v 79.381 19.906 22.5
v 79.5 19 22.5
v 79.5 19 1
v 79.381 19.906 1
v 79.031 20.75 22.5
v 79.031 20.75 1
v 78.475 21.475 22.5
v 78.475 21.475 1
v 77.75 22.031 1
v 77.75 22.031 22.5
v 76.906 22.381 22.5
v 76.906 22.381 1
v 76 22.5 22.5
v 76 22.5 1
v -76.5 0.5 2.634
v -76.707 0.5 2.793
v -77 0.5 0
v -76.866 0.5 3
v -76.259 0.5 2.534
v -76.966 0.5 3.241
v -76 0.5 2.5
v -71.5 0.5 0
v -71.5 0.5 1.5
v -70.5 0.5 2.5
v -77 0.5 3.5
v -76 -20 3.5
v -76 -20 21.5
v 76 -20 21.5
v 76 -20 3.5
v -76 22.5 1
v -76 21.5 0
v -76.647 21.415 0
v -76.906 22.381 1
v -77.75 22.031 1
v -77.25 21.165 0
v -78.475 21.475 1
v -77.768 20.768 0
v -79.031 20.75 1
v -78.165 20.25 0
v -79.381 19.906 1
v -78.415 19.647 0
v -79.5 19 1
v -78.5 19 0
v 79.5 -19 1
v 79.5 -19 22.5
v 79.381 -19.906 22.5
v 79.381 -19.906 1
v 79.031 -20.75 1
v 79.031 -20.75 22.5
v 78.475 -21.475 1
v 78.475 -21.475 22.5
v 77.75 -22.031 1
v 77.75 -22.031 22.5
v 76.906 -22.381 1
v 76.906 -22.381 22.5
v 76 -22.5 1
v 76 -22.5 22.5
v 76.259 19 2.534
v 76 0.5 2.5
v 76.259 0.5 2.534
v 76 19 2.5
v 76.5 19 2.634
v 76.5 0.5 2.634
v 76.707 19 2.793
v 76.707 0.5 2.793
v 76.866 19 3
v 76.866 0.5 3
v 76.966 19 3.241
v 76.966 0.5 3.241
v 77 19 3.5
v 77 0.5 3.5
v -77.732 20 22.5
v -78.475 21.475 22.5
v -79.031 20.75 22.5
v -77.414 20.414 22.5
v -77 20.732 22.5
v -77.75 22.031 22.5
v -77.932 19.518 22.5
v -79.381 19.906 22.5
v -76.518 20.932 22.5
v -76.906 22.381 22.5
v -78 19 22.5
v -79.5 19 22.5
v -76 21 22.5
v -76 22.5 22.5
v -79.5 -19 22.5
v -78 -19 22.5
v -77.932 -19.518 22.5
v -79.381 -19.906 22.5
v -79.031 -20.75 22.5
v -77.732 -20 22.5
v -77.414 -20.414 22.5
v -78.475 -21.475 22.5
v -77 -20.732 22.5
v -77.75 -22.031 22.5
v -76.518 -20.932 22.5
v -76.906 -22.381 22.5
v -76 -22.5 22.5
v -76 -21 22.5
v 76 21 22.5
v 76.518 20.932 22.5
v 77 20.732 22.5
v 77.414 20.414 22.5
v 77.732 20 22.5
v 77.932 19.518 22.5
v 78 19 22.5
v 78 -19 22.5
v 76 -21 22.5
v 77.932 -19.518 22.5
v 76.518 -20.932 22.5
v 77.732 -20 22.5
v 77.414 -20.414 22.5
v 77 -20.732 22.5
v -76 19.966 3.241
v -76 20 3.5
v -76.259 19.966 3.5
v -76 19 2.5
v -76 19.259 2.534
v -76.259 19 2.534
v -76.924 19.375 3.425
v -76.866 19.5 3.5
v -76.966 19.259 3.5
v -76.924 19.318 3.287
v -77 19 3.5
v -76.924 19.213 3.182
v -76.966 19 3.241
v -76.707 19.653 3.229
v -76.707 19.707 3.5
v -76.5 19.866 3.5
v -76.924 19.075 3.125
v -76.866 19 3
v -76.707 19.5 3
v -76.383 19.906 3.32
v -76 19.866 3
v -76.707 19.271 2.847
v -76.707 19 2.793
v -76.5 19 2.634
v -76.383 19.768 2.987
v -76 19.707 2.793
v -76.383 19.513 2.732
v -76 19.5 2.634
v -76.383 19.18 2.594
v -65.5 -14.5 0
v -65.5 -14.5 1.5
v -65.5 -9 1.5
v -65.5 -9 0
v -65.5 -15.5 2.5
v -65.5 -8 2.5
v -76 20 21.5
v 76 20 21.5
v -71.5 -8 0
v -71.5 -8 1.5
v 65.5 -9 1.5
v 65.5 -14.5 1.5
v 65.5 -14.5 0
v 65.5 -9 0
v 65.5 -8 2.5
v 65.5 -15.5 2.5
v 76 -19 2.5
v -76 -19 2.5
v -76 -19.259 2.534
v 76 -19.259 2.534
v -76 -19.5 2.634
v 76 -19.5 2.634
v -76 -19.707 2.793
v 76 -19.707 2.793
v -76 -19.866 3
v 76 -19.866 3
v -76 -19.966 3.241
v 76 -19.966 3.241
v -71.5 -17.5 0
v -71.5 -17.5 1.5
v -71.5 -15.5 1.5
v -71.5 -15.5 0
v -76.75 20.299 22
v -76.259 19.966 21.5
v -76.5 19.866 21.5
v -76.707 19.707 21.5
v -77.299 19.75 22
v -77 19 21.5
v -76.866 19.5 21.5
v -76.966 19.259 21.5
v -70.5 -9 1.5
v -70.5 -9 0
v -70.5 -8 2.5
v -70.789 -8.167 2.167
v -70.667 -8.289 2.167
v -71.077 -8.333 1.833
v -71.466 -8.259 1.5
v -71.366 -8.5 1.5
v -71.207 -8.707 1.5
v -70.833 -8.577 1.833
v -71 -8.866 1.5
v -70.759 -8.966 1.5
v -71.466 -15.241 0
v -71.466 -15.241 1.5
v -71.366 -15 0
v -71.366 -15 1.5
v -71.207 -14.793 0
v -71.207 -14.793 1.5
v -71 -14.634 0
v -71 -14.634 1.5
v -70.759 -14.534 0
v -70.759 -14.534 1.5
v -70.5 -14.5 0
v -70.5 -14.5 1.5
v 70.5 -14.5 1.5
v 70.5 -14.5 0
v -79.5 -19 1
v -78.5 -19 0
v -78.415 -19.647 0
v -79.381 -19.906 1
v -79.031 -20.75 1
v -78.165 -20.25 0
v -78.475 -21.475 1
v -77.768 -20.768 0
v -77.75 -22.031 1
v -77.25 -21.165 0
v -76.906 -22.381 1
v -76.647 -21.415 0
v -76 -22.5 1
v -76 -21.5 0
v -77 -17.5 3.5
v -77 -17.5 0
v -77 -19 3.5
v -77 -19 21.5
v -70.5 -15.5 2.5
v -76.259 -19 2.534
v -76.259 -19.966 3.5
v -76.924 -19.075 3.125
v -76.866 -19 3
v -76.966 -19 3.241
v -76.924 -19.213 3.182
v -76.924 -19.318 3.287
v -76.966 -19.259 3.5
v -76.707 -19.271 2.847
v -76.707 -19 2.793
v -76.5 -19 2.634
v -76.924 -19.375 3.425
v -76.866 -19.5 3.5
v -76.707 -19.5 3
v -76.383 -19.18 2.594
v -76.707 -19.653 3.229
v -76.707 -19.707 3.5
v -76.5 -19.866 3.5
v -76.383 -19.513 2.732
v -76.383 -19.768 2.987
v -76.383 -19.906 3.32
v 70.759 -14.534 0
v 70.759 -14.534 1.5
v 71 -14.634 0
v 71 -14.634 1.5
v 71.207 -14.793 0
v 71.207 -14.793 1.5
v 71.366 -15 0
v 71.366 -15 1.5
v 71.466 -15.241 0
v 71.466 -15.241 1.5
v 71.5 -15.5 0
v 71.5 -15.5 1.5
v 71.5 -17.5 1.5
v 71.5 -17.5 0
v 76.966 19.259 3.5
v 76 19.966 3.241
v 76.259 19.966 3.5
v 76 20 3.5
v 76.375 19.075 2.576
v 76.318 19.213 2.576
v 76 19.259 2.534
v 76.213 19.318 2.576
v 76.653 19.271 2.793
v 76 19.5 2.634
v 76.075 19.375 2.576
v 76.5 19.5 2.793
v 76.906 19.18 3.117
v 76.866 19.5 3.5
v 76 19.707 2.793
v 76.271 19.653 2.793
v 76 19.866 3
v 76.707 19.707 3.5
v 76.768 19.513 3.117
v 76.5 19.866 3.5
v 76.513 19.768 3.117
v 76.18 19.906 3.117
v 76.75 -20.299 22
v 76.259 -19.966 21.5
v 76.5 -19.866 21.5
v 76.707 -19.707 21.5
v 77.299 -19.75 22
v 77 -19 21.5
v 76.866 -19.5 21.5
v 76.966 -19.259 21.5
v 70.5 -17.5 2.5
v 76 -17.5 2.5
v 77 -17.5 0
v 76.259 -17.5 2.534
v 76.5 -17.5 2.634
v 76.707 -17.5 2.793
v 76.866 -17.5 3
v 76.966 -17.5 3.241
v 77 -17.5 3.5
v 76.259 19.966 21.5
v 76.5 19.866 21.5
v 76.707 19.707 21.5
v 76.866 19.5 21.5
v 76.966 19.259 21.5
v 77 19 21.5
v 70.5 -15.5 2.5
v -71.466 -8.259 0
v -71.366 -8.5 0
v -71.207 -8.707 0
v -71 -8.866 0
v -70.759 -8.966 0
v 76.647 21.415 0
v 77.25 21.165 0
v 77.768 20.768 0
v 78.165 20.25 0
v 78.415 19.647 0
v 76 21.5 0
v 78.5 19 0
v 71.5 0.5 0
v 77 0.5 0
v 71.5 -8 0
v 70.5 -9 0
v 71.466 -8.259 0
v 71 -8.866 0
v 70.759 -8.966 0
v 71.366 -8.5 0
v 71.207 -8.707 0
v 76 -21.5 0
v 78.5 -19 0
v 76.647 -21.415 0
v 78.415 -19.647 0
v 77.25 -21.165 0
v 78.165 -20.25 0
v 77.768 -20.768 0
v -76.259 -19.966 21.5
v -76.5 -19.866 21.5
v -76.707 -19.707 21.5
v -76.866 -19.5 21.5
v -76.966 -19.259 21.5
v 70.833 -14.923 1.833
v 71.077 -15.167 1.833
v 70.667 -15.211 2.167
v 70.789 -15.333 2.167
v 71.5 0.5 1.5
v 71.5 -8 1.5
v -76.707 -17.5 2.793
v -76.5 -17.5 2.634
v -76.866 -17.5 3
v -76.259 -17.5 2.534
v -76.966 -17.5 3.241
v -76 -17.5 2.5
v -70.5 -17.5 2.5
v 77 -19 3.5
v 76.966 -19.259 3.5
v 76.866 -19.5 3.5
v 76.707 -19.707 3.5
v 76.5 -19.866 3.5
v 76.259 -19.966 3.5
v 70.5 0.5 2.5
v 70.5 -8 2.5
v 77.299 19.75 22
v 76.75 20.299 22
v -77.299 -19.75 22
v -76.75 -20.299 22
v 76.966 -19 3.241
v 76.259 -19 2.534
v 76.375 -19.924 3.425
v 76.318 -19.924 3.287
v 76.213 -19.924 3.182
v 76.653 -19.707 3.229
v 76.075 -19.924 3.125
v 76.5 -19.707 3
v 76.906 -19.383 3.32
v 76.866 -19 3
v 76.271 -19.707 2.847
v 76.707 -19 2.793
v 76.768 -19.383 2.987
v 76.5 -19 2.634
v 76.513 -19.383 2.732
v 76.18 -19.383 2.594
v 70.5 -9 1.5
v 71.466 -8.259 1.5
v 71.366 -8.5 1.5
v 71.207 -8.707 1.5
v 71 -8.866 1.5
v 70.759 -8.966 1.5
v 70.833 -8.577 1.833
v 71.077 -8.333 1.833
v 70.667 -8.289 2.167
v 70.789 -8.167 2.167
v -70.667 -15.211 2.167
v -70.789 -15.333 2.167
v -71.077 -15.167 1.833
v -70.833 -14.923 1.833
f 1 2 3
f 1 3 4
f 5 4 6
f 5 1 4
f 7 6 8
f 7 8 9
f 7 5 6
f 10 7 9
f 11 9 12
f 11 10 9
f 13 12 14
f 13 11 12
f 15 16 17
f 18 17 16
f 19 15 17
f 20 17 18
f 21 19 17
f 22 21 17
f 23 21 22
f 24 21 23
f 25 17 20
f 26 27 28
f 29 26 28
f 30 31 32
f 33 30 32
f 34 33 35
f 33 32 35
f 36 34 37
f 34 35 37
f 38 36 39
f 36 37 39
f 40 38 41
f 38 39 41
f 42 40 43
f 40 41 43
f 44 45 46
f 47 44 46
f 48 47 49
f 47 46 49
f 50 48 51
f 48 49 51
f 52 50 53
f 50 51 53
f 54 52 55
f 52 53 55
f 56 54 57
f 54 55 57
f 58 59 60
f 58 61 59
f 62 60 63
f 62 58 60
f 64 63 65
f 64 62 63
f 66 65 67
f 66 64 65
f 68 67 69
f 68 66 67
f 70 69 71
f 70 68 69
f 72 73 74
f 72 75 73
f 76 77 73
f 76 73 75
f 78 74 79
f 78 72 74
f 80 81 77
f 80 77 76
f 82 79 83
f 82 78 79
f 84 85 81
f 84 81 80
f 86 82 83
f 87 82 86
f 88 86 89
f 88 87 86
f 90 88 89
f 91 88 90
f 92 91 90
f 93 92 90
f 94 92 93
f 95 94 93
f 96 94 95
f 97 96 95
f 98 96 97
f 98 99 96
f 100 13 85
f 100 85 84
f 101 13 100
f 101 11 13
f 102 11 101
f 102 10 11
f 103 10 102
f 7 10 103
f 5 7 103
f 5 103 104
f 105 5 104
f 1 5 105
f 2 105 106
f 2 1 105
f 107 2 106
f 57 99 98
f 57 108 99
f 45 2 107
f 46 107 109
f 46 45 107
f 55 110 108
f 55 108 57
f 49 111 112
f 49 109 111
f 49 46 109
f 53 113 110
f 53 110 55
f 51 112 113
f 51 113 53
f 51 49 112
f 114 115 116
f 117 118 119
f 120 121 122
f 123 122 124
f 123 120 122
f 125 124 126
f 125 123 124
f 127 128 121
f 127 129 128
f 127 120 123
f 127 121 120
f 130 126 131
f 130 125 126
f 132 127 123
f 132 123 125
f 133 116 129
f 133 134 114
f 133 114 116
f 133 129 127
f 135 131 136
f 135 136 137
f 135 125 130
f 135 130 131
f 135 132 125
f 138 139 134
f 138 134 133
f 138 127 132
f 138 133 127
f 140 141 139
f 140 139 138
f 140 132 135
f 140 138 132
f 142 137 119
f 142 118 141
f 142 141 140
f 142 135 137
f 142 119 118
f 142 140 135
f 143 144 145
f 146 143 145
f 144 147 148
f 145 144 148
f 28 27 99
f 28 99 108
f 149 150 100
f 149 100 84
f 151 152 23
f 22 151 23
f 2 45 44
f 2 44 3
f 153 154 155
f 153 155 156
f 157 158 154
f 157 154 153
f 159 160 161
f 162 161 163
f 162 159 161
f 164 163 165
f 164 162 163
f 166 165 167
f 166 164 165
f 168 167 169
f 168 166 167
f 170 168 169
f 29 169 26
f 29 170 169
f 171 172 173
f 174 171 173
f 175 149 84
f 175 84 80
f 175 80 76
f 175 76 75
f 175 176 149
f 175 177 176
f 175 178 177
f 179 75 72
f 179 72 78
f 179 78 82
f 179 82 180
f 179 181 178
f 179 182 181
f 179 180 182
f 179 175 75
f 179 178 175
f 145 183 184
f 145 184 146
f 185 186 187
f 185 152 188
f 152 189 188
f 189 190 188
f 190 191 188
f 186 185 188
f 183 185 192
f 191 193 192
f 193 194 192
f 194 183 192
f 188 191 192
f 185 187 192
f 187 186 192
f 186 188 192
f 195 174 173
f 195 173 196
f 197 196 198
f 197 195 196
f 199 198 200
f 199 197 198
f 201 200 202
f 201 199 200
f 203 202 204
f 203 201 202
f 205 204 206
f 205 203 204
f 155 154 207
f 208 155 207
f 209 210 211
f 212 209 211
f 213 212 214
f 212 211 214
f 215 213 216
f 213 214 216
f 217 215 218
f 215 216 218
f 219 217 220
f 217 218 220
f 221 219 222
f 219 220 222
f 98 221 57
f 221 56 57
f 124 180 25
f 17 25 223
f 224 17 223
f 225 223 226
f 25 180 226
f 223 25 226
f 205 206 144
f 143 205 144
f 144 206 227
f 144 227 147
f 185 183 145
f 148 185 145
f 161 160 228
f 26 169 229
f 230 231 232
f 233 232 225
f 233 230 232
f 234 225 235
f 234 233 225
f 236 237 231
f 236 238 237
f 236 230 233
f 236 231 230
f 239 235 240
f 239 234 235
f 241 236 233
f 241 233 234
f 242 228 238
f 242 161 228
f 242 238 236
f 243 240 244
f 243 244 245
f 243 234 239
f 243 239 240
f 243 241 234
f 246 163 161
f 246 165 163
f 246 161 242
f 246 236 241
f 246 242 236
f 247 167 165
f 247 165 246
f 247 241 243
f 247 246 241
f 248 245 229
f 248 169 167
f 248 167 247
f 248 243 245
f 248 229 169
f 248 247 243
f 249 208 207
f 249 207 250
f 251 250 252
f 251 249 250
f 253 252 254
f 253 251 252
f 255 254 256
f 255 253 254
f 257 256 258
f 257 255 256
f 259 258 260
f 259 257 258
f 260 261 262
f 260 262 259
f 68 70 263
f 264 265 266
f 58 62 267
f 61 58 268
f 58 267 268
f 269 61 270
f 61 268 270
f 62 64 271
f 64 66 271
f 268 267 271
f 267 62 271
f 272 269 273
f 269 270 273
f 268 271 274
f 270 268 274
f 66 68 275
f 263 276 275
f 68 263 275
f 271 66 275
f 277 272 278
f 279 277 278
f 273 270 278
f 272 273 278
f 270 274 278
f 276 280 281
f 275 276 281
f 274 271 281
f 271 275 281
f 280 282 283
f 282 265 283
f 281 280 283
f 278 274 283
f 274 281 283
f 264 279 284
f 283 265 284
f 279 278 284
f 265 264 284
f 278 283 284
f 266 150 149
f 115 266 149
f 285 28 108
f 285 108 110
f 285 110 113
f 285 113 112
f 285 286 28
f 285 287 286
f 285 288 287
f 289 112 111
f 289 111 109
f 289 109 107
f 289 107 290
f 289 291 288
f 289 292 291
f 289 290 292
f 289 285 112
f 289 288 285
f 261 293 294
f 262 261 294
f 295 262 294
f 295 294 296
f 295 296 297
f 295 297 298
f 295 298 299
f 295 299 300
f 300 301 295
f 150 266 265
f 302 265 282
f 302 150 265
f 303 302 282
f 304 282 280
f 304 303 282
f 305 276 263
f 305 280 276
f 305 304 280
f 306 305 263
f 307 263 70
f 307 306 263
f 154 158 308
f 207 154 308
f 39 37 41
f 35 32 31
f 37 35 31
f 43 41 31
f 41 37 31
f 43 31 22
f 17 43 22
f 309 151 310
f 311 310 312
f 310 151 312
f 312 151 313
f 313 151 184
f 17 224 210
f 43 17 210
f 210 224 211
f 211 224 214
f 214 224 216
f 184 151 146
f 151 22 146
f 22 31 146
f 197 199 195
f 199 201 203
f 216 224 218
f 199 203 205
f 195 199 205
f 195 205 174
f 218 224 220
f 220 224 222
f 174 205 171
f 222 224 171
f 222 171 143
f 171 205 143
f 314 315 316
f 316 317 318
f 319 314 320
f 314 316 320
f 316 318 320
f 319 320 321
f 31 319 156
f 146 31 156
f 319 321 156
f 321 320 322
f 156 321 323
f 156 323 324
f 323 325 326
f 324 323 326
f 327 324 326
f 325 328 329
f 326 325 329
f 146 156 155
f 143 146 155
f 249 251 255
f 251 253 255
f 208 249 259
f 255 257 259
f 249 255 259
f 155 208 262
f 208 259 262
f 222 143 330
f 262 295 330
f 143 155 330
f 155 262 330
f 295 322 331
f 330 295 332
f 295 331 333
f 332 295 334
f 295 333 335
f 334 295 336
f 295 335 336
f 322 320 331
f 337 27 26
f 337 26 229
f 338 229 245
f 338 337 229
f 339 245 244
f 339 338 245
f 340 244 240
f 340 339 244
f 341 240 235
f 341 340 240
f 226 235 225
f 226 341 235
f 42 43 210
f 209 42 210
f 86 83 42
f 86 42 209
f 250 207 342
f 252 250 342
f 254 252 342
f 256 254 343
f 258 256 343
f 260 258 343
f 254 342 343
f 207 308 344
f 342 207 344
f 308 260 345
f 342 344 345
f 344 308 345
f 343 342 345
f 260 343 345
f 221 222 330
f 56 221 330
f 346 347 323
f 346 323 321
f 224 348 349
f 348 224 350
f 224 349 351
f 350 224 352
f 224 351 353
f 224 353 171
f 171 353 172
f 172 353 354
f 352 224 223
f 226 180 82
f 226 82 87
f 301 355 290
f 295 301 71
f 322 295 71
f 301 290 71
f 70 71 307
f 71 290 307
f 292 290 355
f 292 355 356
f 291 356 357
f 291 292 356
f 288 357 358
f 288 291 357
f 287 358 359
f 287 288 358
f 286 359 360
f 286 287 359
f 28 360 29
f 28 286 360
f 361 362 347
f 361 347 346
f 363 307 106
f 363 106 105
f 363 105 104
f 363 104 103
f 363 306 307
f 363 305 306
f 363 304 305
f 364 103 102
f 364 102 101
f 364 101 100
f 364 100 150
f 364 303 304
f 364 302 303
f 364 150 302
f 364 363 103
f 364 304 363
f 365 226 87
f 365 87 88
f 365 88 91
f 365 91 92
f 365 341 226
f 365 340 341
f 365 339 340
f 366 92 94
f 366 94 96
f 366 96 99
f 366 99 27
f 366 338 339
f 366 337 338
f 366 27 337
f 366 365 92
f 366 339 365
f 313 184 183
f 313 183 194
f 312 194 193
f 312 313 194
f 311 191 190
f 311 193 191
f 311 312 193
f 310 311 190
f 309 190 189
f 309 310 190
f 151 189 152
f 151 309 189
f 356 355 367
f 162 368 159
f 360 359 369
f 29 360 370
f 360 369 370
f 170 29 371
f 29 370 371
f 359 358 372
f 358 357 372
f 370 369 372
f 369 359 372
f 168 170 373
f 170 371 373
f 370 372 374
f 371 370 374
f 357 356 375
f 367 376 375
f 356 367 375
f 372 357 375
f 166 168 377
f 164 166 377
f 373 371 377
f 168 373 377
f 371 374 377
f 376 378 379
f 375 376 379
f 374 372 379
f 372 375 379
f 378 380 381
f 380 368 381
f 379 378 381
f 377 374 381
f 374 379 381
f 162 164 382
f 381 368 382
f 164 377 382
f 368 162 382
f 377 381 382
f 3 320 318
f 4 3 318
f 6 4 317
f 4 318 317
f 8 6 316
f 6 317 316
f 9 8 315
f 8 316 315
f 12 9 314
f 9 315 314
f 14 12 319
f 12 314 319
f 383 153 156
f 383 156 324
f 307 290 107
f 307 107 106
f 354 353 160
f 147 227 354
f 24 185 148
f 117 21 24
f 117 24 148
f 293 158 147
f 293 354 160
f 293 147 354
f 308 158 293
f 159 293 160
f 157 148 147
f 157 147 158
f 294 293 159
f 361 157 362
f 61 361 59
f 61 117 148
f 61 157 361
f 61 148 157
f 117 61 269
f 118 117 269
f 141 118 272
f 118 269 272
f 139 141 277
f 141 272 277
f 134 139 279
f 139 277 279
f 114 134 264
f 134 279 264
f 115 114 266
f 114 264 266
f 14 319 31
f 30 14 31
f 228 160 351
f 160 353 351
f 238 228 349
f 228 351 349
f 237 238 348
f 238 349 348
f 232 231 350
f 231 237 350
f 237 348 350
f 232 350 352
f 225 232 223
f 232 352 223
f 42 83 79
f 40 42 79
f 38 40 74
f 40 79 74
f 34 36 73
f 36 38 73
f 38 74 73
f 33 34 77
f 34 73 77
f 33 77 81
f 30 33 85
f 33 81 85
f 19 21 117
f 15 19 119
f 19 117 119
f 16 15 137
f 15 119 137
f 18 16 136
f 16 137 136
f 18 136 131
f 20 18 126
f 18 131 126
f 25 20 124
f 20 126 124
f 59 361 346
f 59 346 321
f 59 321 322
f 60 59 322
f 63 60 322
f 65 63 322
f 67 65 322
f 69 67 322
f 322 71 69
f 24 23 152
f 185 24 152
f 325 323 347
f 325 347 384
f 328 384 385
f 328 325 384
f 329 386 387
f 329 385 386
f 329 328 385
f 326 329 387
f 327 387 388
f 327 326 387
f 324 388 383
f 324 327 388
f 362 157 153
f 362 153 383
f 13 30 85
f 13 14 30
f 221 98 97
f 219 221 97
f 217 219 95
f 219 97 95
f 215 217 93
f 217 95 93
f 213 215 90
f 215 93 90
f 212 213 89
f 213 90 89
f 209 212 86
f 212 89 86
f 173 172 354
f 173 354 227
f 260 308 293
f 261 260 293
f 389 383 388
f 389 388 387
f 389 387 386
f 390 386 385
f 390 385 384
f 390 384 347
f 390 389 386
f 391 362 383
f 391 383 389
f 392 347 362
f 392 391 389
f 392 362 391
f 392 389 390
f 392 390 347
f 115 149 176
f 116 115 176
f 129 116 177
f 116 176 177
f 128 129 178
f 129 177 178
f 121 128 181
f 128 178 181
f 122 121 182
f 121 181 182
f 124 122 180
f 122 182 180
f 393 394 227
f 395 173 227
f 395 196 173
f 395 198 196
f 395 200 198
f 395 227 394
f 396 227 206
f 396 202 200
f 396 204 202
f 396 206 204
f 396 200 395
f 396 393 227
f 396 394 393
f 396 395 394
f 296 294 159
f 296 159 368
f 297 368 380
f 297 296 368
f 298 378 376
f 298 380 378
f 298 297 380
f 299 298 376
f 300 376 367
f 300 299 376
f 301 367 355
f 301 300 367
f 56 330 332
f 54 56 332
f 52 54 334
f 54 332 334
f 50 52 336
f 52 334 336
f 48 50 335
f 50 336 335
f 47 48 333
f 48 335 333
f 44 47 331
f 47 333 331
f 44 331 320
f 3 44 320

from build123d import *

# Parameters (mm, degrees)
SKETCH_W        = 154
SKETCH_H        = 40
PAD_DEPTH       = 2.5
SKETCH001_W     = 154
SKETCH001_H     = 22.5
PAD001_DEPTH    = 2.5
SKETCH002_W     = 154
SKETCH002_H     = 22.5
PAD002_DEPTH    = 2.5
SKETCH003_W     = 45
SKETCH003_H     = 22.5
PAD003_DEPTH    = 2.5
SKETCH004_W     = 45
SKETCH004_H     = 22.5
PAD004_DEPTH    = 2.5
SKETCH005_W     = 5.5
SKETCH005_H     = 18
POCKET_DEPTH    = 5
SKETCH006_W     = 6
SKETCH006_H     = 5.5
POCKET001_DEPTH = 5
FILLET_R        = 1
CHAMFER_SIZE    = 1
FILLET001_R     = 1
CHAMFER001_SIZE = 1
FILLET002_R     = 1
FILLET003_R     = 3.5
CHAMFER002_SIZE = 1
CHAMFER003_SIZE = 1


with BuildPart() as part:
    # Sketch → Pad (new body)
    with BuildSketch(Plane.XY):
        Rectangle(SKETCH_W, SKETCH_H)
    extrude(amount=PAD_DEPTH)

    # Sketch001 (on Face2 of Pad) → Pad001 (join)
    with BuildSketch(Plane.XZ.offset(20)):
        with Locations((0, 11.25)):
            Rectangle(SKETCH001_W, SKETCH001_H)
    extrude(amount=PAD001_DEPTH)

    # Sketch002 (on Face1 of Pad001) → Pad002 (join)
    with BuildSketch(Plane(origin=(0, 20, 0), x_dir=(-1, 0, 0), z_dir=(0, 1, 0))):
        with Locations((0, 11.25)):
            Rectangle(SKETCH002_W, SKETCH002_H)
    extrude(amount=PAD002_DEPTH)

    # Sketch003 (on Face9 of Pad002) → Pad003 (join)
    with BuildSketch(Plane.YZ.offset(77)):
        with Locations((0, 11.25)):
            Rectangle(SKETCH003_W, SKETCH003_H)
    extrude(amount=PAD003_DEPTH)

    # Sketch004 (on Face4 of Pad003) → Pad004 (join)
    with BuildSketch(Plane(origin=(-77, 0, 0), x_dir=(0, -1, 0), z_dir=(-1, 0, 0))):
        with Locations((0, 11.25)):
            Rectangle(SKETCH004_W, SKETCH004_H)
    extrude(amount=PAD004_DEPTH)

    # Sketch005 (on Face10 of Pad004) → Pocket (cut)
    with BuildSketch(Plane.XY.offset(2.5)):
        with Locations((-74.25, -8.5)):
            Rectangle(SKETCH005_W, SKETCH005_H)
        with Locations((74.25, -8.5)):
            Rectangle(SKETCH005_W, SKETCH005_H)
    extrude(amount=-POCKET_DEPTH, mode=Mode.SUBTRACT)

    # Sketch006 (on Face15 of Pocket) → Pocket001 (cut)
    with BuildSketch(Plane.XY.offset(2.5)):
        with Locations((-68.5, -11.75)):
            Rectangle(SKETCH006_W, SKETCH006_H)
        with Locations((68.5, -11.75)):
            Rectangle(SKETCH006_W, SKETCH006_H)
    extrude(amount=-POCKET001_DEPTH, mode=Mode.SUBTRACT)

    # Fillet
    fillet_edges = [part.edges().sort_by_distance(p)[0] for p in [
        (71.5, -9, 1.25),
        (71.5, -14.5, 1.25),
    ]]
    fillet(fillet_edges, radius=FILLET_R)

    # Chamfer
    chamfer_edges = [part.edges().sort_by_distance(p)[0] for p in [
        (68, -9, 2.5),
        (68, -14.5, 2.5),
    ]]
    chamfer(chamfer_edges, length=CHAMFER_SIZE)

    # Fillet001
    fillet001_edges = [part.edges().sort_by_distance(p)[0] for p in [
        (-71.5, -14.5, 1.25),
        (-71.5, -9, 1.25),
    ]]
    fillet(fillet001_edges, radius=FILLET001_R)

    # Chamfer001
    chamfer001_edges = [part.edges().sort_by_distance(p)[0] for p in [
        (-68, -14.5, 2.5),
        (-68, -9, 2.5),
    ]]
    chamfer(chamfer001_edges, length=CHAMFER001_SIZE)

    # Fillet002
    fillet002_edges = [part.edges().sort_by_distance(p)[0] for p in [
        (77, 20, 12.5),
        (77, 10.25, 2.5),
        (0, 20, 2.5),
        (77, -18.75, 2.5),
        (77, -20, 12.5),
        (0, -20, 2.5),
        (-77, 20, 12.5),
        (-77, 10.25, 2.5),
        (-77, -18.75, 2.5),
        (-77, -20, 12.5),
    ]]
    fillet(fillet002_edges, radius=FILLET002_R)

    # Fillet003
    fillet003_edges = [part.edges().sort_by_distance(p)[0] for p in [
        (-79.5, 22.5, 11.25),
        (-79.5, -22.5, 11.25),
        (79.5, -22.5, 11.25),
        (79.5, 22.5, 11.25),
    ]]
    fillet(fillet003_edges, radius=FILLET003_R)

    # Chamfer002
    chamfer002_edges = [part.edges().sort_by_distance(p)[0] for p in [
        (0, 22.5, 0),
    ]]
    chamfer(chamfer002_edges, length=CHAMFER002_SIZE)

    # Chamfer003
    chamfer003_edges = [part.edges().sort_by_distance(p)[0] for p in [
        (0, 20, 22.5),
    ]]
    chamfer(chamfer003_edges, length=CHAMFER003_SIZE)


solid = part.part
